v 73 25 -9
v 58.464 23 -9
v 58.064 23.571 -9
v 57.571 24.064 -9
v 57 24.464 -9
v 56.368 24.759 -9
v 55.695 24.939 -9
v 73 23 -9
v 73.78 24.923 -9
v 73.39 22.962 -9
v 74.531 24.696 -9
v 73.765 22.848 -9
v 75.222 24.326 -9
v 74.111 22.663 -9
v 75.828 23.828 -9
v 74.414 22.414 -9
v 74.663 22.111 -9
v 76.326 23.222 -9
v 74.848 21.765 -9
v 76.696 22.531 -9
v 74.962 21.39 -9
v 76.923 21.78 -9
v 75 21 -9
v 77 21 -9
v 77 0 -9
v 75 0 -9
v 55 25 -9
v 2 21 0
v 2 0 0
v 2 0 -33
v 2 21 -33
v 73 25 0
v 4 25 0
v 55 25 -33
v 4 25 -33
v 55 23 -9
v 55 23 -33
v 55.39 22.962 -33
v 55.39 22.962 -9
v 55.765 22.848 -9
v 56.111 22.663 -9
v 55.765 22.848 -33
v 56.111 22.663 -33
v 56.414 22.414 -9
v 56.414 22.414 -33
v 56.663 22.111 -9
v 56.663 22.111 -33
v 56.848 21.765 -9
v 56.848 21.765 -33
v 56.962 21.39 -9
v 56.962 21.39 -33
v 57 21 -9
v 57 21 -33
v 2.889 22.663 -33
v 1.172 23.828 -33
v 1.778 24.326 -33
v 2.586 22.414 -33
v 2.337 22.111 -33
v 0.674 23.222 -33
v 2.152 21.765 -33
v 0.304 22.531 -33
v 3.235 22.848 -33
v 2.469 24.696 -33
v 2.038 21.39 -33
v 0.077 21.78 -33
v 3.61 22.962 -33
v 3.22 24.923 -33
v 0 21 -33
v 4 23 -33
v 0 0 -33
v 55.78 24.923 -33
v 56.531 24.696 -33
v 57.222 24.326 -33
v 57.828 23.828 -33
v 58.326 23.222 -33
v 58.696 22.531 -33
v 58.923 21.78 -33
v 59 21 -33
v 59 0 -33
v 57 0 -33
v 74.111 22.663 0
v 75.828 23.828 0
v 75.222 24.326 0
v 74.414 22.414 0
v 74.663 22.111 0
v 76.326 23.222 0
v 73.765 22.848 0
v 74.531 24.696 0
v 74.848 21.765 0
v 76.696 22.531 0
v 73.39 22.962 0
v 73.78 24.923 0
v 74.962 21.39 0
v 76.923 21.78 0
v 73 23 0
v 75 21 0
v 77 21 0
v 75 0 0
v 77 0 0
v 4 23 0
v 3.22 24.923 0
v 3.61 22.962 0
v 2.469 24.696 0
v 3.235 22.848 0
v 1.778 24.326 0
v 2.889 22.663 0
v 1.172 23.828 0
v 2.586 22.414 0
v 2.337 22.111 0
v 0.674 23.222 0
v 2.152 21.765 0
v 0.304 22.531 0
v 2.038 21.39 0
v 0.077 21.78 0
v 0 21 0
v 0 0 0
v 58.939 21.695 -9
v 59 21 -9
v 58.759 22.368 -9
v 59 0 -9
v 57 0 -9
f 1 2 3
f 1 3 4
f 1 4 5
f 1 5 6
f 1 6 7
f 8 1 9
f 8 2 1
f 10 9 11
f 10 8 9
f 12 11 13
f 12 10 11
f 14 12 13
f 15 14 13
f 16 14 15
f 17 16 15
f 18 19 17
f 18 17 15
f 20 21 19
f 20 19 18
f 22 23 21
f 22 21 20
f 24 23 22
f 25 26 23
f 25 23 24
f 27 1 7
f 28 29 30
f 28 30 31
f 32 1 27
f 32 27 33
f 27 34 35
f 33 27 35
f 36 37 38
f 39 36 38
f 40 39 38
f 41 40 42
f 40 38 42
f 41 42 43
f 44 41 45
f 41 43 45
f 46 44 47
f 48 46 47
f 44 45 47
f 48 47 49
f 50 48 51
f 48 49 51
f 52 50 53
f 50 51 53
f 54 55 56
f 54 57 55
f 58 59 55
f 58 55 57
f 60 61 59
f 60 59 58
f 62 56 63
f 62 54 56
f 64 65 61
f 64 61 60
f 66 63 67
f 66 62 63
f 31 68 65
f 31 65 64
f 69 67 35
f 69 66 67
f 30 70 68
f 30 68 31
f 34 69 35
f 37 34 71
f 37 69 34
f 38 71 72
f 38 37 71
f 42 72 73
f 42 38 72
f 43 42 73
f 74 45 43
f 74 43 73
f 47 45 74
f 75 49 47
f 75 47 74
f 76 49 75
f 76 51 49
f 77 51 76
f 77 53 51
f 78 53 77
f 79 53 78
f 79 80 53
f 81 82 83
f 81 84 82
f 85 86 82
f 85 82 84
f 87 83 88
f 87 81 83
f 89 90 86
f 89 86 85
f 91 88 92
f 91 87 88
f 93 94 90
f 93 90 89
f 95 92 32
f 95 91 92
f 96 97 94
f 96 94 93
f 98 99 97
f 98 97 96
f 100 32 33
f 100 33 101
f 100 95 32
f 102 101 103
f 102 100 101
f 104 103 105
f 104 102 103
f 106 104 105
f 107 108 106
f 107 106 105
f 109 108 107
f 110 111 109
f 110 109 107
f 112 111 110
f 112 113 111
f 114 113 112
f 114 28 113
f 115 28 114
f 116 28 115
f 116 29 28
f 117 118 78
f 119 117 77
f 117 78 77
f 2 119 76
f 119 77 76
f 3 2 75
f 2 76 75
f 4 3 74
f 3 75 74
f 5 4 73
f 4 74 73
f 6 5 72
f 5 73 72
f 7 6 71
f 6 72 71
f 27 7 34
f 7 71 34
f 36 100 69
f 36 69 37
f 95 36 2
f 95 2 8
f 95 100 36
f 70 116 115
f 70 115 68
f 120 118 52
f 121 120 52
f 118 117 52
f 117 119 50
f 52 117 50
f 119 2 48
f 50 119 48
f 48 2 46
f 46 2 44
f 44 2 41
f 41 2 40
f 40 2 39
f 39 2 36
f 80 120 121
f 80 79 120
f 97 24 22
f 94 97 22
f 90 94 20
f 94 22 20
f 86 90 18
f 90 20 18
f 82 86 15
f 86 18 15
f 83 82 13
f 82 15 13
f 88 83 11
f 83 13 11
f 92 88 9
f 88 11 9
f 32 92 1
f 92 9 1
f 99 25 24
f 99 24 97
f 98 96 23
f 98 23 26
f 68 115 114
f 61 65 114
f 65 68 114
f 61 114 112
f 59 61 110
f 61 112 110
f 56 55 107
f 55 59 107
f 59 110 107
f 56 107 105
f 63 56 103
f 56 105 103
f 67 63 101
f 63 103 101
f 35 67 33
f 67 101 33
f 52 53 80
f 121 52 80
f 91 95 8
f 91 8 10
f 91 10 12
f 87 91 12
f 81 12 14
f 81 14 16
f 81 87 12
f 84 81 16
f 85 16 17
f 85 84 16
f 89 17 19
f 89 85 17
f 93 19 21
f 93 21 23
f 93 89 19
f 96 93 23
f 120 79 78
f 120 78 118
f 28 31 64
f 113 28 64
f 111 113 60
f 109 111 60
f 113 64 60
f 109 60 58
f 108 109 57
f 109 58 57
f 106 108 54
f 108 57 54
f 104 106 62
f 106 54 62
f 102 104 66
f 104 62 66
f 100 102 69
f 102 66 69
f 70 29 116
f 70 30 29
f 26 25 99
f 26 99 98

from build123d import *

# Parameters (mm, degrees)
BOSS_EXTRUDE1_DEPTH = 25
CUT_EXTRUDE1_DEPTH  = 88.424252928
CUT_EXTRUDE2_DEPTH  = 9
FILLET3_R           = 4


with BuildPart() as part:
    # Sketch1 → Boss-Extrude1 (new body)
    with BuildSketch(Plane(origin=(0, 0, 0), x_dir=(1, 0, 0), z_dir=(0, 1, 0))):
        Polygon((0, 0), (0, 33), (59, 33), (59, 9), (77, 9), (77, 0), align=None)
    extrude(amount=BOSS_EXTRUDE1_DEPTH)

    # Sketch3 → Cut-Extrude1 (cut, through all)
    with BuildSketch(Plane(origin=(0, 0, -33), x_dir=(-1, 0, 0), z_dir=(0, 0, -1))):
        with BuildLine():
            Line((-57, 0), (-2, 0))
            Line((-2, 0), (-2, 21))
            ThreePointArc((-2, 21), (-2.585786438, 22.414213562), (-4, 23))
            Line((-4, 23), (-55, 23))
            ThreePointArc((-55, 23), (-56.414213562, 22.414213562), (-57, 21))
            Line((-57, 21), (-57, 0))
        make_face()
    extrude(amount=-CUT_EXTRUDE1_DEPTH, mode=Mode.SUBTRACT)

    # Sketch4 → Cut-Extrude2 (cut)
    with BuildSketch(Plane.XY):
        with BuildLine():
            Line((75, 0), (51.080310893, 0))
            Line((51.080310893, 0), (51.080310893, 23))
            Line((51.080310893, 23), (73, 23))
            ThreePointArc((73, 23), (74.414213562, 22.414213562), (75, 21))
            Line((75, 21), (75, 0))
        make_face()
    extrude(amount=-CUT_EXTRUDE2_DEPTH, mode=Mode.SUBTRACT)

    # Fillet3
    # the kernel refuses this fillet: 4 mm, written as the material it takes off along each edge
    with BuildSketch(Plane(origin=(59, 25, -43), x_dir=(-1, 0, 0), z_dir=(0, 0, 1))) as fillet3_piece_1:
        with BuildLine():
            CenterArc((FILLET3_R, FILLET3_R), FILLET3_R, 180, 90)
            Line((0, FILLET3_R), (0, 0))
            Line((0, 0), (FILLET3_R, 0))
        make_face()
    extrude(amount=34, mode=Mode.SUBTRACT)
    with BuildSketch(Plane(origin=(0, 25, 10), x_dir=(0, -1, 0), z_dir=(0, 0, -1))) as fillet3_piece_2:
        with BuildLine():
            CenterArc((FILLET3_R, -FILLET3_R), FILLET3_R, 90, 90)
            Line((0, -FILLET3_R), (0, 0))
            Line((0, 0), (FILLET3_R, 0))
        make_face()
    extrude(amount=53, mode=Mode.SUBTRACT)
    with BuildSketch(Plane(origin=(77, 25, -19), x_dir=(-1, 0, 0), z_dir=(0, 0, 1))) as fillet3_piece_3:
        with BuildLine():
            CenterArc((FILLET3_R, FILLET3_R), FILLET3_R, 180, 90)
            Line((0, FILLET3_R), (0, 0))
            Line((0, 0), (FILLET3_R, 0))
        make_face()
    extrude(amount=29, mode=Mode.SUBTRACT)


solid = part.part
